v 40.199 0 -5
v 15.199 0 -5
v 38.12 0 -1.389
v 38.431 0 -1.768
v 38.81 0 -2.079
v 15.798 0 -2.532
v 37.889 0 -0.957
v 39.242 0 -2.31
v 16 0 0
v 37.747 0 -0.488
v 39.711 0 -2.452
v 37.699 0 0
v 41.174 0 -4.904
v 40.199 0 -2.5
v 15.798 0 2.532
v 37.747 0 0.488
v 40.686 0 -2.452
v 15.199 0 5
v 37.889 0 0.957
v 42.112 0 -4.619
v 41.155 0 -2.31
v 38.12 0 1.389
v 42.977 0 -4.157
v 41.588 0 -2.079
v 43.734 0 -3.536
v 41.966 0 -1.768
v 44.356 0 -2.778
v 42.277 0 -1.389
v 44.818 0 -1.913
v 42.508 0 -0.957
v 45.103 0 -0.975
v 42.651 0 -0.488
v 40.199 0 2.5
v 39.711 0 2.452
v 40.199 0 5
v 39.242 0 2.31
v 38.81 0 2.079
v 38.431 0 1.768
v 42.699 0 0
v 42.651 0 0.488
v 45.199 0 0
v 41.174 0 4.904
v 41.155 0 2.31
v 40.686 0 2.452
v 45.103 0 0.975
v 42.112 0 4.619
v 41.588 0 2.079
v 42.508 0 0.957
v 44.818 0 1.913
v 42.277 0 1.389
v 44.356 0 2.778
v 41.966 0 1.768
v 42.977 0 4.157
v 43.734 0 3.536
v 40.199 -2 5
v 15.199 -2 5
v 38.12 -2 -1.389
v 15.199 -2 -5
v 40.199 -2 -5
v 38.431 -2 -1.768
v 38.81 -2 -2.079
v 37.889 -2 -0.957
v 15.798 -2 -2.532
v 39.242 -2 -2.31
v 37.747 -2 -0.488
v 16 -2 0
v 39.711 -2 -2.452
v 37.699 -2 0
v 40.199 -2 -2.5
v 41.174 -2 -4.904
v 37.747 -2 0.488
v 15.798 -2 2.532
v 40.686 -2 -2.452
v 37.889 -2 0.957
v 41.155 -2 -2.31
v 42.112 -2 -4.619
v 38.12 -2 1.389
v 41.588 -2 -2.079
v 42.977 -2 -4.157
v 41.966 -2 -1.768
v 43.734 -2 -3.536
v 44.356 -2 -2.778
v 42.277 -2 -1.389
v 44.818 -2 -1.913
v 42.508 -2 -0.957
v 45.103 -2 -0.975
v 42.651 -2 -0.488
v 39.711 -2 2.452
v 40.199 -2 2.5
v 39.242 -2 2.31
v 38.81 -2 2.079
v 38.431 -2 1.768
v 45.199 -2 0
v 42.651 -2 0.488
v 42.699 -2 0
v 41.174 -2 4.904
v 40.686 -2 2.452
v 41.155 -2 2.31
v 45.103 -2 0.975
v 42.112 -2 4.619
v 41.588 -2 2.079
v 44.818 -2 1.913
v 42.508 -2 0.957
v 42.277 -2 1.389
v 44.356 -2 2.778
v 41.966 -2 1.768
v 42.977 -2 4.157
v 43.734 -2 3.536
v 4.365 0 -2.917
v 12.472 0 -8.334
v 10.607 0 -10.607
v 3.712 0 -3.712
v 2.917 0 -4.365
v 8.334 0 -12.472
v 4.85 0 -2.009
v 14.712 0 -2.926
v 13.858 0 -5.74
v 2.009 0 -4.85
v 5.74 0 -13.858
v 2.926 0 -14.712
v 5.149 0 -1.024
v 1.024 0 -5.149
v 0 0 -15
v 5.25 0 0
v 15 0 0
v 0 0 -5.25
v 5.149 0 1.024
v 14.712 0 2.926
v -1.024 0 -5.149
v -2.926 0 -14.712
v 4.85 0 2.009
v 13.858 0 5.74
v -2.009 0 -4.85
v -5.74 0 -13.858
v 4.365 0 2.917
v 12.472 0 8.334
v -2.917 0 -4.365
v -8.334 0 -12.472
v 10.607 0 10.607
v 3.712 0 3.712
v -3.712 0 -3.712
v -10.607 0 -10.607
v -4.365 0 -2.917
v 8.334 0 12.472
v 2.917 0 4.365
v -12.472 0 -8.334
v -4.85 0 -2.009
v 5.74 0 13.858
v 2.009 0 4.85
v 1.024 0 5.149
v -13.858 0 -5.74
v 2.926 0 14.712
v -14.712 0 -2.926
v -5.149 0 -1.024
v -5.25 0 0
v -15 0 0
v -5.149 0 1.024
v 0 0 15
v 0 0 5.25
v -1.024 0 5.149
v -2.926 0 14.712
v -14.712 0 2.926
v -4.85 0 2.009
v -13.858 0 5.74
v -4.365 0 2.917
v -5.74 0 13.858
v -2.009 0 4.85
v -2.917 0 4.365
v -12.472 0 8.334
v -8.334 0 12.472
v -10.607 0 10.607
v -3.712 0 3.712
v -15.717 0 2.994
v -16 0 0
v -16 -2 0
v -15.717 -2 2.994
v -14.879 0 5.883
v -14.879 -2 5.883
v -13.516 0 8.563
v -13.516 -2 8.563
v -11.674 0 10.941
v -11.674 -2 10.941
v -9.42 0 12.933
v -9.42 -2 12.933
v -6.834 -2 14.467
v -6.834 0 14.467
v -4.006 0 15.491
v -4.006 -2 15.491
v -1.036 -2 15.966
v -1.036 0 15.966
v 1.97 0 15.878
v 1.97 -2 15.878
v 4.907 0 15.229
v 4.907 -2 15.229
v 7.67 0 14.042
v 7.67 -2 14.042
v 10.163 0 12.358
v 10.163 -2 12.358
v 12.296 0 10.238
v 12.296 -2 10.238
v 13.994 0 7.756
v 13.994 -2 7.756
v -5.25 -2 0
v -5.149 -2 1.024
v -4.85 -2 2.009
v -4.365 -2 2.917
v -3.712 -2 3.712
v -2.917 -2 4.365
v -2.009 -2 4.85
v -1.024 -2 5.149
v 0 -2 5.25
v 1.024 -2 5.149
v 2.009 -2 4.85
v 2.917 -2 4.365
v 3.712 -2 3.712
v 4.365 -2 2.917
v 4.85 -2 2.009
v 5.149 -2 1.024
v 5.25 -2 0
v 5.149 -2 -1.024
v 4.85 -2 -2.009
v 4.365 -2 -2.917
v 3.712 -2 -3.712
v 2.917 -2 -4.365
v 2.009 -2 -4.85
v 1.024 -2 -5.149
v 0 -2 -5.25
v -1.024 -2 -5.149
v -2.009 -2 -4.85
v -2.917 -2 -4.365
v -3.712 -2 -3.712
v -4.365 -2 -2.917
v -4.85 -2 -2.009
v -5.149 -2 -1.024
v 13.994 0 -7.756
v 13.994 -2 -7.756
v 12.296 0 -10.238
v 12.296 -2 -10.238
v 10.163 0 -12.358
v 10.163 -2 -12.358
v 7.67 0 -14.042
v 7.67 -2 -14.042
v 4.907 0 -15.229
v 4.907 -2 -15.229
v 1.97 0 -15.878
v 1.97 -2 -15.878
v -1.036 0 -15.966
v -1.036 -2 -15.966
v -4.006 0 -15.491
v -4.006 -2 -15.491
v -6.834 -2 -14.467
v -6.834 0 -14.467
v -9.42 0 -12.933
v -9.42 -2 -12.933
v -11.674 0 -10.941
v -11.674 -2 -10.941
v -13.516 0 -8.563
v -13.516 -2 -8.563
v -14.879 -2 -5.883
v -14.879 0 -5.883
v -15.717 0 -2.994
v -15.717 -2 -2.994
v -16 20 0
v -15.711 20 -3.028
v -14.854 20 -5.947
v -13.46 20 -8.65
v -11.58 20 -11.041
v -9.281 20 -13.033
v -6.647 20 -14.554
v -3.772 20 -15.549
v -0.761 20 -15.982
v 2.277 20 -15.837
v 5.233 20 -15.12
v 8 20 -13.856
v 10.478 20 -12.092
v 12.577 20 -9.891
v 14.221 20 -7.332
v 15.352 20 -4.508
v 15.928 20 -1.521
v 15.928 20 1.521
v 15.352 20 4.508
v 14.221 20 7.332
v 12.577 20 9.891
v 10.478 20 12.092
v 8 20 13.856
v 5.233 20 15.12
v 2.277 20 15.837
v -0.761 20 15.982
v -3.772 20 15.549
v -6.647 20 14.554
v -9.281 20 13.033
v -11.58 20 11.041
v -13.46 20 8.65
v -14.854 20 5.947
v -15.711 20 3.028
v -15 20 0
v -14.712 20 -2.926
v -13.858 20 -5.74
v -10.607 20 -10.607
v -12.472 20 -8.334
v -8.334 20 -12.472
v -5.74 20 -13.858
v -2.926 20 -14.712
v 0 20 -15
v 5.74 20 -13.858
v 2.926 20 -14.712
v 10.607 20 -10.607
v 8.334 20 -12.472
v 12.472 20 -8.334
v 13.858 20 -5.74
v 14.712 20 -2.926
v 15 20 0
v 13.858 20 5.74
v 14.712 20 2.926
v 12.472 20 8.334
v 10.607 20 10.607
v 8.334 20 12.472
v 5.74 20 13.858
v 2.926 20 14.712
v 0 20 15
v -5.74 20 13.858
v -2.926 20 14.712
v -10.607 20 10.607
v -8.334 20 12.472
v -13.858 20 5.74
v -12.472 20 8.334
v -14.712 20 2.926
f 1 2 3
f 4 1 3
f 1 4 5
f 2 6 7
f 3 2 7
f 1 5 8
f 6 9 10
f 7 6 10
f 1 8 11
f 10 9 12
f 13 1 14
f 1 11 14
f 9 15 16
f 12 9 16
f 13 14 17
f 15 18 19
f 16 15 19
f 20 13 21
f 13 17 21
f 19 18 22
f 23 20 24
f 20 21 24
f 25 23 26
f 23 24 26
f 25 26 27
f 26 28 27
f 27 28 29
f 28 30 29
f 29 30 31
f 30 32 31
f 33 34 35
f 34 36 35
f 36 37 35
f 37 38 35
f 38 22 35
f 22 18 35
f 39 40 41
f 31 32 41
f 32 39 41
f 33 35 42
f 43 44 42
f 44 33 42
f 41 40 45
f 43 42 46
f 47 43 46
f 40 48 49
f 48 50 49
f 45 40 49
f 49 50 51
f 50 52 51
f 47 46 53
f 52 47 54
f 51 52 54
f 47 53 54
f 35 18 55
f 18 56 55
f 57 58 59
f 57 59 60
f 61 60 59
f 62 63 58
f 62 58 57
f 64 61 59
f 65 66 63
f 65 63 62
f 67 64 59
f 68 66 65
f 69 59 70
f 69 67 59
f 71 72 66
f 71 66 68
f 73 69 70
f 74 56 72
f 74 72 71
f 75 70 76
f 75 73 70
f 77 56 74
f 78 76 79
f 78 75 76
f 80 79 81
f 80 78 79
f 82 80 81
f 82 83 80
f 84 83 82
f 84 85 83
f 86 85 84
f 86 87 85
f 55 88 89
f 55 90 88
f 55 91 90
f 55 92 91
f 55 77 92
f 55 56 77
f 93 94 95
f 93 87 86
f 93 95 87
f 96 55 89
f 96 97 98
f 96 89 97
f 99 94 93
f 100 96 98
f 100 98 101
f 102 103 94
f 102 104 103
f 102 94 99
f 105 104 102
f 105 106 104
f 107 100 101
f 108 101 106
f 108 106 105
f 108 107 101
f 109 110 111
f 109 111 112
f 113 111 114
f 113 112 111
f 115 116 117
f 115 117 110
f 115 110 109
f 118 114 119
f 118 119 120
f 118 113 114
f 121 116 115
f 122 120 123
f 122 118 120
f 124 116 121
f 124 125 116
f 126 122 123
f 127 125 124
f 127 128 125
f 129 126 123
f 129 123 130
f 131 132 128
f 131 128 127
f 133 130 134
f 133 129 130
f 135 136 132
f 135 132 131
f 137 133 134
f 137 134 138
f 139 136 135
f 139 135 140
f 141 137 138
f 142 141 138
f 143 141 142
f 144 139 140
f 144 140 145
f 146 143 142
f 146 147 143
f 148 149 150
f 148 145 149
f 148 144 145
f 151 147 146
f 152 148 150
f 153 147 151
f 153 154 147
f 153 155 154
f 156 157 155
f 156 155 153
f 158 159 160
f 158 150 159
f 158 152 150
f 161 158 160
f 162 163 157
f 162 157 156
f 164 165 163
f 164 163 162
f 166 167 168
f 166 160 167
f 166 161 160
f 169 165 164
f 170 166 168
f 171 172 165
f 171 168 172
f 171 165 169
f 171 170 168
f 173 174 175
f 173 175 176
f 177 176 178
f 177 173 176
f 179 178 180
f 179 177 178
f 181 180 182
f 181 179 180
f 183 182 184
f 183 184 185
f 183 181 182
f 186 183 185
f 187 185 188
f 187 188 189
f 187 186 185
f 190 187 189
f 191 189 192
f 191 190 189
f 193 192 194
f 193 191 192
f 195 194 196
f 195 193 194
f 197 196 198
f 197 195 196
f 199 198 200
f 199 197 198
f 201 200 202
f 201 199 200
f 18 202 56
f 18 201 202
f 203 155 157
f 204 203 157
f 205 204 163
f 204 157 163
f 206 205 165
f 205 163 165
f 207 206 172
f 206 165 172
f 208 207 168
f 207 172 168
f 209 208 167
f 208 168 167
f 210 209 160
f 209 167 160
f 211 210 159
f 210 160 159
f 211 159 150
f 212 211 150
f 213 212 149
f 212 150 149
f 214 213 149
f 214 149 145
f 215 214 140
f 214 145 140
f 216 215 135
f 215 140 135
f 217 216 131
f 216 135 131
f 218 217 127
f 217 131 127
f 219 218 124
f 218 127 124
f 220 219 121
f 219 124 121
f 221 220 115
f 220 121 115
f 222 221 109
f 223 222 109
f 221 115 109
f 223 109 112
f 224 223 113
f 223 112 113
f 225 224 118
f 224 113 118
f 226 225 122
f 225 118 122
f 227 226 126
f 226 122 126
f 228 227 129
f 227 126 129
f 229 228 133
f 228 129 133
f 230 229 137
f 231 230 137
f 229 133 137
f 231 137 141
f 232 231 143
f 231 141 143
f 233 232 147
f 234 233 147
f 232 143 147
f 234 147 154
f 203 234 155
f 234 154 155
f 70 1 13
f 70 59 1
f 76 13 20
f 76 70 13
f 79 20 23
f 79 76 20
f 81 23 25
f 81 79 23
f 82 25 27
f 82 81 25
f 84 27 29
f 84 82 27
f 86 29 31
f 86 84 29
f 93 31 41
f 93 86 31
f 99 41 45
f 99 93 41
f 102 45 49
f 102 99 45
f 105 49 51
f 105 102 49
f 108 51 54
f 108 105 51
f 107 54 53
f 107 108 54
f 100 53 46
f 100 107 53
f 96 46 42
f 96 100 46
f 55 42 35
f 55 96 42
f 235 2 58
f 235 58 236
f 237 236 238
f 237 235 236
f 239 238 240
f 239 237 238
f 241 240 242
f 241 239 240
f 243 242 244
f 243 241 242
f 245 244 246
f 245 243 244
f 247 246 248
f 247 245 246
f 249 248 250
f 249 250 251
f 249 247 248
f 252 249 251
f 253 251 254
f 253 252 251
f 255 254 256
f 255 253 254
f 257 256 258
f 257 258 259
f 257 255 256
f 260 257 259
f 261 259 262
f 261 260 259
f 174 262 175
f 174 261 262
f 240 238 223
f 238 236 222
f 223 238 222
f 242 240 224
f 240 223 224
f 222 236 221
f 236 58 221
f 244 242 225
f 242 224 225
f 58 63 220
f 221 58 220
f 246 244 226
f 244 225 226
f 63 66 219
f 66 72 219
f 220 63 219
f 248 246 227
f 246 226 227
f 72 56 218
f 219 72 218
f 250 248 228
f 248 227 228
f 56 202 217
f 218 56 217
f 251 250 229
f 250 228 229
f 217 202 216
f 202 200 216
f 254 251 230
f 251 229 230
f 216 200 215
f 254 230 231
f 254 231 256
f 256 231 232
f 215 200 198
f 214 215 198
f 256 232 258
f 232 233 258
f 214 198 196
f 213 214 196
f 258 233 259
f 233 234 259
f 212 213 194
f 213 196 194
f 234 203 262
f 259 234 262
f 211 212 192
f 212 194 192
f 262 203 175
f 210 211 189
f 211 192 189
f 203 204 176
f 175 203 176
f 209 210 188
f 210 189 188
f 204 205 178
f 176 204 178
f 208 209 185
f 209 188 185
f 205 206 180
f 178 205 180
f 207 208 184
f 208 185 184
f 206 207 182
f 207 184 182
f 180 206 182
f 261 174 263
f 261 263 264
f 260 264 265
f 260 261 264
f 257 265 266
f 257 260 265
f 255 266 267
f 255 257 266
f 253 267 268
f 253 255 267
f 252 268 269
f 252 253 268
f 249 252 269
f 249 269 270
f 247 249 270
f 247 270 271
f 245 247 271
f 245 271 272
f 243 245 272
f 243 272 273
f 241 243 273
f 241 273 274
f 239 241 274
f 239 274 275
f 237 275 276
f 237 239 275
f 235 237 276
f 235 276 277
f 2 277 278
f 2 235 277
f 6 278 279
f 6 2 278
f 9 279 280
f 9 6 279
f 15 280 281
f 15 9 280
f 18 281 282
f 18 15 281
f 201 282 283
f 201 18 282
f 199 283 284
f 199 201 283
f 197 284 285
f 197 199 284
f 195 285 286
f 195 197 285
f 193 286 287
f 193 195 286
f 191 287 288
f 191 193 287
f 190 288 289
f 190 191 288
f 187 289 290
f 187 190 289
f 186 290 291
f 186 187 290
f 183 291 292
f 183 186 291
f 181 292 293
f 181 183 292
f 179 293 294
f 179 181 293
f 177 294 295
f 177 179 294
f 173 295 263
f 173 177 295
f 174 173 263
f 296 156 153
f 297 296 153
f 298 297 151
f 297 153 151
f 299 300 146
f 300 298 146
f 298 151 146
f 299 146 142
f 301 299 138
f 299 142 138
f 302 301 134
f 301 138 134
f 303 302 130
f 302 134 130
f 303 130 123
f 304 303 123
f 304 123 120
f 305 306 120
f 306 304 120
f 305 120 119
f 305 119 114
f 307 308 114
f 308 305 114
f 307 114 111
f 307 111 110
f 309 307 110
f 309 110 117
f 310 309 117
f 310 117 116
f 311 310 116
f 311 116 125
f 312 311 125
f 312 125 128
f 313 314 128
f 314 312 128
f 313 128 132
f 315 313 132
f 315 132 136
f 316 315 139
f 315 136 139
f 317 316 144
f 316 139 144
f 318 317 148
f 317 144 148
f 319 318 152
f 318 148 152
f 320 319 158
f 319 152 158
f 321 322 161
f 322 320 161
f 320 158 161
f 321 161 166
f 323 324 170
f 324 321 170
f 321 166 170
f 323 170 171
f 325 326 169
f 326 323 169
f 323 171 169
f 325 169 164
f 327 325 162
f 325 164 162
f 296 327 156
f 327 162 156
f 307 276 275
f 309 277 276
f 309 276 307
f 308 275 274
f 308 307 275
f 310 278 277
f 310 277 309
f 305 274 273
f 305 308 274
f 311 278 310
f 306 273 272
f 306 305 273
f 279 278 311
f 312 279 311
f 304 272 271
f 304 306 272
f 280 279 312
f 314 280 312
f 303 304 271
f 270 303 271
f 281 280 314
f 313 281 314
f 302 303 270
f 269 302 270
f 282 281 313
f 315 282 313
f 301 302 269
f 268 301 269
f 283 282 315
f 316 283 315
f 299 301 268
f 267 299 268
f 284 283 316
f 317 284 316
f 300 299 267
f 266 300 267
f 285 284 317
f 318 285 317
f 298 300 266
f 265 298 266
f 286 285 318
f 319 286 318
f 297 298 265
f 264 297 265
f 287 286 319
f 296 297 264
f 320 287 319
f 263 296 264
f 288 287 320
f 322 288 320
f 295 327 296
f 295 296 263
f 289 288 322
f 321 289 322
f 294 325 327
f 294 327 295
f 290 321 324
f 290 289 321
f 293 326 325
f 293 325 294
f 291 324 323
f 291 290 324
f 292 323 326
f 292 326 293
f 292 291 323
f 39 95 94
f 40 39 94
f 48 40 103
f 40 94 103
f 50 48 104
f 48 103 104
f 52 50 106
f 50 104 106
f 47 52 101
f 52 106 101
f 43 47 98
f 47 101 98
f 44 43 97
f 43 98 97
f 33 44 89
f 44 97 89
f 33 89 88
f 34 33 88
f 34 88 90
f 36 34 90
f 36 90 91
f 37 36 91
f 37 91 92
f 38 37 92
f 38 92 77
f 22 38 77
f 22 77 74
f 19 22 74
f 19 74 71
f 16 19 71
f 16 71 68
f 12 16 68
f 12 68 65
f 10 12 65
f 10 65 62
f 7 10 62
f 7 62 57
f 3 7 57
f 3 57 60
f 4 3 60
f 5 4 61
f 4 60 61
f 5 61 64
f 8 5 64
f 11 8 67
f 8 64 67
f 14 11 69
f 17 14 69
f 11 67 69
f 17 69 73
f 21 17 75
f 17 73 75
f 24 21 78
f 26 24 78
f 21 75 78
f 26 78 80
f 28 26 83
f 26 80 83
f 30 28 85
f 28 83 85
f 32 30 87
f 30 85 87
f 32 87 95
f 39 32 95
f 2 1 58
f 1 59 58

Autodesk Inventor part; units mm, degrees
ref_plane "YZ Plane" through (0, 0, 0) normal (1, 0, 0) x (0, 1, 0)
ref_plane "XZ Plane" through (0, 0, 0) normal (0, 1, 0) x (-1, 0, 0)
ref_plane "XY Plane" through (0, 0, 0) normal (0, 0, 1) x (1, 0, 0)
sketch "Sketch1" plane through (0, 0, 0) normal (0, 1, 0) x (-1, 0, 0)
  circle A0 centre (0, 0) radius 15
  circle A1 centre (0, 0) radius 16
  circle A2 centre (0, 0) radius 5.25
  dimension "d0" = 30
  dimension "d1" = 1
  dimension "d6" = 10.5
extrude "Extrusion1" add sketch "Sketch1" along normal blind 20 contours A1
extrude "Extrusion2" add sketch "Sketch1" against normal blind 2 contours A0 | A1
sketch "Sketch3" plane through (0, -2, 0) normal (0, -1, 0) x (1, 0, 0)
  circle A0 centre (0, 0) radius 16 projected
  line L0 (15.1987, 5) -> (40.1987, 5)
  arc A1 (40.1987, -5) -> (40.1987, 5) centre (40.1987, 0) ccw
  line L1 (40.1987, -5) -> (15.1987, -5)
  circle A2 centre (40.1987, 0) radius 2.5
  dimension "d9" = 5
  dimension "d10" = 25
  dimension "d13" = 5
extrude "Extrusion3" add sketch "Sketch3" against normal blind 2 contours A0 L0 A1 L1
properties part number "Pok Mk 3 Yaw Motor Mount"
